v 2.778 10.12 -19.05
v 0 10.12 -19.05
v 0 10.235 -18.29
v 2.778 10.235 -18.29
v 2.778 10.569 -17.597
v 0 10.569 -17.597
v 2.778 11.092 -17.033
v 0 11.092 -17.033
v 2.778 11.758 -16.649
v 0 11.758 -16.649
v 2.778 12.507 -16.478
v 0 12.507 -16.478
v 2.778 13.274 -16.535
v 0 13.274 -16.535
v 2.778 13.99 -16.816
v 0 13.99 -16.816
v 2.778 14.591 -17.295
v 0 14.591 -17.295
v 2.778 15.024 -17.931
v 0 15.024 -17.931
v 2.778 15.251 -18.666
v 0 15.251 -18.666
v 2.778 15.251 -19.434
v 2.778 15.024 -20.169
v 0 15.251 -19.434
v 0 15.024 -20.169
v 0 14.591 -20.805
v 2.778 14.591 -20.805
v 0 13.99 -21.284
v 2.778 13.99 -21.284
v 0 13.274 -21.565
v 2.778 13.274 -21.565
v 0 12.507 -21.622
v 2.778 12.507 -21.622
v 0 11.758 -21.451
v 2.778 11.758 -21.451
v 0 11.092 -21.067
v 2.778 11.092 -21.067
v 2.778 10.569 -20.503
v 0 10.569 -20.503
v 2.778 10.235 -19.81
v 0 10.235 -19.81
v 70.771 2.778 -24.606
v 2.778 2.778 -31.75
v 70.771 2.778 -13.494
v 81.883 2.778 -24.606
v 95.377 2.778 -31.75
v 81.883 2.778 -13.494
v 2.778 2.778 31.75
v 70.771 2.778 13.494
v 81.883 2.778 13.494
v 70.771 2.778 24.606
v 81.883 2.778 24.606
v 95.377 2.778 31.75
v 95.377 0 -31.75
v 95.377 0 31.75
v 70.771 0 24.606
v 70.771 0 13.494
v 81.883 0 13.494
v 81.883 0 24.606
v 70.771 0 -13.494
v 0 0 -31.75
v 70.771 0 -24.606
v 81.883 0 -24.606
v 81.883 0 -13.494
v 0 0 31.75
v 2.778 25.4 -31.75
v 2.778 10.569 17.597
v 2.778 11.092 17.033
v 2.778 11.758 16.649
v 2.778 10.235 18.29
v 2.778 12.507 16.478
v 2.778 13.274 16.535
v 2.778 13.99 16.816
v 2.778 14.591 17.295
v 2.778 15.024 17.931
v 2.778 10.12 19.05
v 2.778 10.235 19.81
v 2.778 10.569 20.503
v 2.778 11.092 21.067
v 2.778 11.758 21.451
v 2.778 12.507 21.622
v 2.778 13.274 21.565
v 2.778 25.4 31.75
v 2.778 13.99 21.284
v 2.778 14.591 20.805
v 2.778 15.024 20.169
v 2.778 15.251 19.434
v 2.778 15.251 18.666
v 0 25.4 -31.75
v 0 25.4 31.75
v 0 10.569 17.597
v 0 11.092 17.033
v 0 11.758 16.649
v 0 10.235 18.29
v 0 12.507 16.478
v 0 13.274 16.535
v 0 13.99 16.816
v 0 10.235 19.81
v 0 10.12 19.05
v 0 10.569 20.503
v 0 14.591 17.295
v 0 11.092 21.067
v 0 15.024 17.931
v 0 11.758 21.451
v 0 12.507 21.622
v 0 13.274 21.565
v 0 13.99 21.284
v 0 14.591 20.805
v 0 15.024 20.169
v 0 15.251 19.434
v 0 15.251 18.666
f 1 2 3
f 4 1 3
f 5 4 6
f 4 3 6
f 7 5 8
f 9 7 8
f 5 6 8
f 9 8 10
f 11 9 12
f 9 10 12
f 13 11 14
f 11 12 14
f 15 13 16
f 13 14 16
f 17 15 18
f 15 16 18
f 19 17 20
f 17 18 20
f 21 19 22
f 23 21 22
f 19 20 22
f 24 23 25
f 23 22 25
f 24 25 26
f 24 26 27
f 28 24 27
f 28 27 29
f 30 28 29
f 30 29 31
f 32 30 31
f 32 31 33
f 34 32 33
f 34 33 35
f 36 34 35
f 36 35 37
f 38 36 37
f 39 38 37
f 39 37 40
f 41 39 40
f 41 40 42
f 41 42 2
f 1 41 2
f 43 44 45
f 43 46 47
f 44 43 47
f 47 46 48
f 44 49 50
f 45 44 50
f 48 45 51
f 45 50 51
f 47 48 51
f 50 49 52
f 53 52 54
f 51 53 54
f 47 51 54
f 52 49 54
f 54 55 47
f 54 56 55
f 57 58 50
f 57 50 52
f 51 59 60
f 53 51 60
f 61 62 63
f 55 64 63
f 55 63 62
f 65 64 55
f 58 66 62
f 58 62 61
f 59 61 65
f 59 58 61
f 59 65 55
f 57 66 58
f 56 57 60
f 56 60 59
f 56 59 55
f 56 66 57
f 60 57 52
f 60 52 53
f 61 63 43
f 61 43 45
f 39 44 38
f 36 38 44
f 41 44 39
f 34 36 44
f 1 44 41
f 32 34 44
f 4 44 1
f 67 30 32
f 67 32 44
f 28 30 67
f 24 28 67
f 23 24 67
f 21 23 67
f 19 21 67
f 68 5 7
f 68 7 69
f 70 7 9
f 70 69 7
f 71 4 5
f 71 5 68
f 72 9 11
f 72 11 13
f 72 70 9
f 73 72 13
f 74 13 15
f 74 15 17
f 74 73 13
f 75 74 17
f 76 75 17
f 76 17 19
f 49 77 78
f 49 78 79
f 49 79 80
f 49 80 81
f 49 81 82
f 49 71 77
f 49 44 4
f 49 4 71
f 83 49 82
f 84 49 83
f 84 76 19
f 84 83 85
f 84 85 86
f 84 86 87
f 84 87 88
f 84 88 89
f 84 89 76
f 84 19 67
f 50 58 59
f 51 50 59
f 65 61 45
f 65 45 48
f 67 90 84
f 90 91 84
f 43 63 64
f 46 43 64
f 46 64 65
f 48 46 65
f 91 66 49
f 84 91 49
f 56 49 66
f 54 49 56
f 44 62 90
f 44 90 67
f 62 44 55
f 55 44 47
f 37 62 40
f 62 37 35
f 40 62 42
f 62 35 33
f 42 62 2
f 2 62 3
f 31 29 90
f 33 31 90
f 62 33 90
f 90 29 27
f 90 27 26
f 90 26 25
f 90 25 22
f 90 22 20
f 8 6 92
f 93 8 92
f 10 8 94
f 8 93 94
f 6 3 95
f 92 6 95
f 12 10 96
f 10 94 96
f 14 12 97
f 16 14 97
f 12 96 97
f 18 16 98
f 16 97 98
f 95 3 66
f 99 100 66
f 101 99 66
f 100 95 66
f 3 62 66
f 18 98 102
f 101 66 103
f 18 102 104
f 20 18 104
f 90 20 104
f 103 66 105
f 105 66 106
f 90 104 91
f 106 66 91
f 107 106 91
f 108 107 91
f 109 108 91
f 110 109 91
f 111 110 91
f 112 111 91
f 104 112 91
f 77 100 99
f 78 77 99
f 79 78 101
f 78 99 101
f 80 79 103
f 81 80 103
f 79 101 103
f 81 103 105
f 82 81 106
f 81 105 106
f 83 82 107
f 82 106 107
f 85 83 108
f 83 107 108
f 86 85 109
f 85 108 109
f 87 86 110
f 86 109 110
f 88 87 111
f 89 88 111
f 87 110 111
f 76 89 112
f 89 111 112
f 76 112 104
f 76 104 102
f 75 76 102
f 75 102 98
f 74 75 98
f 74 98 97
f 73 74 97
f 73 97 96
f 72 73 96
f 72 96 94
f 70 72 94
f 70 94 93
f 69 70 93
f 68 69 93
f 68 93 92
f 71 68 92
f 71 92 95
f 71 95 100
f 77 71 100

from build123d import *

# Parameters (mm, degrees)
F0_W     = 95.377
F0_H     = 25.4
F1_DEPTH = 31.75
F2_T     = -2.778125
F3_W     = 11.1125
F3_H     = 11.1125
F4_DEPTH = 25.401
F5_R     = 2.579688
F6_DEPTH = 95.378


with BuildPart() as f1:
    # F0 (on Top) → F1 (new body, symmetric)
    with BuildSketch(Plane.XY):
        with Locations((47.6885, 12.7)):
            Rectangle(F0_W, F0_H)
    extrude(amount=F1_DEPTH, both=True)

    # F2
    f2_openings = [f1.faces().sort_by_distance(p)[0] for p in [
        (95.377, 12.7, 0),
        (47.6885, 12.7, 31.75),
        (47.6885, 12.7, -31.75),
        (47.6885, 25.4, 0),
    ]]
    offset(amount=F2_T, openings=f2_openings)

    # F3 (on face) → F4 (cut, through all)
    with BuildSketch(Plane.XZ):
        with Locations((76.327, -19.05)):
            Rectangle(F3_W, F3_H)
        with Locations((76.327, 19.05)):
            Rectangle(F3_W, F3_H)
    extrude(amount=-F4_DEPTH, mode=Mode.SUBTRACT)

    # F5 (on face) → F6 (cut, through all)
    with BuildSketch(Plane(origin=(0, 0, 0), x_dir=(0, -1, 0), z_dir=(-1, 0, 0))):
        with Locations((-12.7, 19.05)):
            Circle(F5_R)
        with Locations((-12.7, -19.05)):
            Circle(F5_R)
    extrude(amount=-F6_DEPTH, mode=Mode.SUBTRACT)


solid = f1.part
